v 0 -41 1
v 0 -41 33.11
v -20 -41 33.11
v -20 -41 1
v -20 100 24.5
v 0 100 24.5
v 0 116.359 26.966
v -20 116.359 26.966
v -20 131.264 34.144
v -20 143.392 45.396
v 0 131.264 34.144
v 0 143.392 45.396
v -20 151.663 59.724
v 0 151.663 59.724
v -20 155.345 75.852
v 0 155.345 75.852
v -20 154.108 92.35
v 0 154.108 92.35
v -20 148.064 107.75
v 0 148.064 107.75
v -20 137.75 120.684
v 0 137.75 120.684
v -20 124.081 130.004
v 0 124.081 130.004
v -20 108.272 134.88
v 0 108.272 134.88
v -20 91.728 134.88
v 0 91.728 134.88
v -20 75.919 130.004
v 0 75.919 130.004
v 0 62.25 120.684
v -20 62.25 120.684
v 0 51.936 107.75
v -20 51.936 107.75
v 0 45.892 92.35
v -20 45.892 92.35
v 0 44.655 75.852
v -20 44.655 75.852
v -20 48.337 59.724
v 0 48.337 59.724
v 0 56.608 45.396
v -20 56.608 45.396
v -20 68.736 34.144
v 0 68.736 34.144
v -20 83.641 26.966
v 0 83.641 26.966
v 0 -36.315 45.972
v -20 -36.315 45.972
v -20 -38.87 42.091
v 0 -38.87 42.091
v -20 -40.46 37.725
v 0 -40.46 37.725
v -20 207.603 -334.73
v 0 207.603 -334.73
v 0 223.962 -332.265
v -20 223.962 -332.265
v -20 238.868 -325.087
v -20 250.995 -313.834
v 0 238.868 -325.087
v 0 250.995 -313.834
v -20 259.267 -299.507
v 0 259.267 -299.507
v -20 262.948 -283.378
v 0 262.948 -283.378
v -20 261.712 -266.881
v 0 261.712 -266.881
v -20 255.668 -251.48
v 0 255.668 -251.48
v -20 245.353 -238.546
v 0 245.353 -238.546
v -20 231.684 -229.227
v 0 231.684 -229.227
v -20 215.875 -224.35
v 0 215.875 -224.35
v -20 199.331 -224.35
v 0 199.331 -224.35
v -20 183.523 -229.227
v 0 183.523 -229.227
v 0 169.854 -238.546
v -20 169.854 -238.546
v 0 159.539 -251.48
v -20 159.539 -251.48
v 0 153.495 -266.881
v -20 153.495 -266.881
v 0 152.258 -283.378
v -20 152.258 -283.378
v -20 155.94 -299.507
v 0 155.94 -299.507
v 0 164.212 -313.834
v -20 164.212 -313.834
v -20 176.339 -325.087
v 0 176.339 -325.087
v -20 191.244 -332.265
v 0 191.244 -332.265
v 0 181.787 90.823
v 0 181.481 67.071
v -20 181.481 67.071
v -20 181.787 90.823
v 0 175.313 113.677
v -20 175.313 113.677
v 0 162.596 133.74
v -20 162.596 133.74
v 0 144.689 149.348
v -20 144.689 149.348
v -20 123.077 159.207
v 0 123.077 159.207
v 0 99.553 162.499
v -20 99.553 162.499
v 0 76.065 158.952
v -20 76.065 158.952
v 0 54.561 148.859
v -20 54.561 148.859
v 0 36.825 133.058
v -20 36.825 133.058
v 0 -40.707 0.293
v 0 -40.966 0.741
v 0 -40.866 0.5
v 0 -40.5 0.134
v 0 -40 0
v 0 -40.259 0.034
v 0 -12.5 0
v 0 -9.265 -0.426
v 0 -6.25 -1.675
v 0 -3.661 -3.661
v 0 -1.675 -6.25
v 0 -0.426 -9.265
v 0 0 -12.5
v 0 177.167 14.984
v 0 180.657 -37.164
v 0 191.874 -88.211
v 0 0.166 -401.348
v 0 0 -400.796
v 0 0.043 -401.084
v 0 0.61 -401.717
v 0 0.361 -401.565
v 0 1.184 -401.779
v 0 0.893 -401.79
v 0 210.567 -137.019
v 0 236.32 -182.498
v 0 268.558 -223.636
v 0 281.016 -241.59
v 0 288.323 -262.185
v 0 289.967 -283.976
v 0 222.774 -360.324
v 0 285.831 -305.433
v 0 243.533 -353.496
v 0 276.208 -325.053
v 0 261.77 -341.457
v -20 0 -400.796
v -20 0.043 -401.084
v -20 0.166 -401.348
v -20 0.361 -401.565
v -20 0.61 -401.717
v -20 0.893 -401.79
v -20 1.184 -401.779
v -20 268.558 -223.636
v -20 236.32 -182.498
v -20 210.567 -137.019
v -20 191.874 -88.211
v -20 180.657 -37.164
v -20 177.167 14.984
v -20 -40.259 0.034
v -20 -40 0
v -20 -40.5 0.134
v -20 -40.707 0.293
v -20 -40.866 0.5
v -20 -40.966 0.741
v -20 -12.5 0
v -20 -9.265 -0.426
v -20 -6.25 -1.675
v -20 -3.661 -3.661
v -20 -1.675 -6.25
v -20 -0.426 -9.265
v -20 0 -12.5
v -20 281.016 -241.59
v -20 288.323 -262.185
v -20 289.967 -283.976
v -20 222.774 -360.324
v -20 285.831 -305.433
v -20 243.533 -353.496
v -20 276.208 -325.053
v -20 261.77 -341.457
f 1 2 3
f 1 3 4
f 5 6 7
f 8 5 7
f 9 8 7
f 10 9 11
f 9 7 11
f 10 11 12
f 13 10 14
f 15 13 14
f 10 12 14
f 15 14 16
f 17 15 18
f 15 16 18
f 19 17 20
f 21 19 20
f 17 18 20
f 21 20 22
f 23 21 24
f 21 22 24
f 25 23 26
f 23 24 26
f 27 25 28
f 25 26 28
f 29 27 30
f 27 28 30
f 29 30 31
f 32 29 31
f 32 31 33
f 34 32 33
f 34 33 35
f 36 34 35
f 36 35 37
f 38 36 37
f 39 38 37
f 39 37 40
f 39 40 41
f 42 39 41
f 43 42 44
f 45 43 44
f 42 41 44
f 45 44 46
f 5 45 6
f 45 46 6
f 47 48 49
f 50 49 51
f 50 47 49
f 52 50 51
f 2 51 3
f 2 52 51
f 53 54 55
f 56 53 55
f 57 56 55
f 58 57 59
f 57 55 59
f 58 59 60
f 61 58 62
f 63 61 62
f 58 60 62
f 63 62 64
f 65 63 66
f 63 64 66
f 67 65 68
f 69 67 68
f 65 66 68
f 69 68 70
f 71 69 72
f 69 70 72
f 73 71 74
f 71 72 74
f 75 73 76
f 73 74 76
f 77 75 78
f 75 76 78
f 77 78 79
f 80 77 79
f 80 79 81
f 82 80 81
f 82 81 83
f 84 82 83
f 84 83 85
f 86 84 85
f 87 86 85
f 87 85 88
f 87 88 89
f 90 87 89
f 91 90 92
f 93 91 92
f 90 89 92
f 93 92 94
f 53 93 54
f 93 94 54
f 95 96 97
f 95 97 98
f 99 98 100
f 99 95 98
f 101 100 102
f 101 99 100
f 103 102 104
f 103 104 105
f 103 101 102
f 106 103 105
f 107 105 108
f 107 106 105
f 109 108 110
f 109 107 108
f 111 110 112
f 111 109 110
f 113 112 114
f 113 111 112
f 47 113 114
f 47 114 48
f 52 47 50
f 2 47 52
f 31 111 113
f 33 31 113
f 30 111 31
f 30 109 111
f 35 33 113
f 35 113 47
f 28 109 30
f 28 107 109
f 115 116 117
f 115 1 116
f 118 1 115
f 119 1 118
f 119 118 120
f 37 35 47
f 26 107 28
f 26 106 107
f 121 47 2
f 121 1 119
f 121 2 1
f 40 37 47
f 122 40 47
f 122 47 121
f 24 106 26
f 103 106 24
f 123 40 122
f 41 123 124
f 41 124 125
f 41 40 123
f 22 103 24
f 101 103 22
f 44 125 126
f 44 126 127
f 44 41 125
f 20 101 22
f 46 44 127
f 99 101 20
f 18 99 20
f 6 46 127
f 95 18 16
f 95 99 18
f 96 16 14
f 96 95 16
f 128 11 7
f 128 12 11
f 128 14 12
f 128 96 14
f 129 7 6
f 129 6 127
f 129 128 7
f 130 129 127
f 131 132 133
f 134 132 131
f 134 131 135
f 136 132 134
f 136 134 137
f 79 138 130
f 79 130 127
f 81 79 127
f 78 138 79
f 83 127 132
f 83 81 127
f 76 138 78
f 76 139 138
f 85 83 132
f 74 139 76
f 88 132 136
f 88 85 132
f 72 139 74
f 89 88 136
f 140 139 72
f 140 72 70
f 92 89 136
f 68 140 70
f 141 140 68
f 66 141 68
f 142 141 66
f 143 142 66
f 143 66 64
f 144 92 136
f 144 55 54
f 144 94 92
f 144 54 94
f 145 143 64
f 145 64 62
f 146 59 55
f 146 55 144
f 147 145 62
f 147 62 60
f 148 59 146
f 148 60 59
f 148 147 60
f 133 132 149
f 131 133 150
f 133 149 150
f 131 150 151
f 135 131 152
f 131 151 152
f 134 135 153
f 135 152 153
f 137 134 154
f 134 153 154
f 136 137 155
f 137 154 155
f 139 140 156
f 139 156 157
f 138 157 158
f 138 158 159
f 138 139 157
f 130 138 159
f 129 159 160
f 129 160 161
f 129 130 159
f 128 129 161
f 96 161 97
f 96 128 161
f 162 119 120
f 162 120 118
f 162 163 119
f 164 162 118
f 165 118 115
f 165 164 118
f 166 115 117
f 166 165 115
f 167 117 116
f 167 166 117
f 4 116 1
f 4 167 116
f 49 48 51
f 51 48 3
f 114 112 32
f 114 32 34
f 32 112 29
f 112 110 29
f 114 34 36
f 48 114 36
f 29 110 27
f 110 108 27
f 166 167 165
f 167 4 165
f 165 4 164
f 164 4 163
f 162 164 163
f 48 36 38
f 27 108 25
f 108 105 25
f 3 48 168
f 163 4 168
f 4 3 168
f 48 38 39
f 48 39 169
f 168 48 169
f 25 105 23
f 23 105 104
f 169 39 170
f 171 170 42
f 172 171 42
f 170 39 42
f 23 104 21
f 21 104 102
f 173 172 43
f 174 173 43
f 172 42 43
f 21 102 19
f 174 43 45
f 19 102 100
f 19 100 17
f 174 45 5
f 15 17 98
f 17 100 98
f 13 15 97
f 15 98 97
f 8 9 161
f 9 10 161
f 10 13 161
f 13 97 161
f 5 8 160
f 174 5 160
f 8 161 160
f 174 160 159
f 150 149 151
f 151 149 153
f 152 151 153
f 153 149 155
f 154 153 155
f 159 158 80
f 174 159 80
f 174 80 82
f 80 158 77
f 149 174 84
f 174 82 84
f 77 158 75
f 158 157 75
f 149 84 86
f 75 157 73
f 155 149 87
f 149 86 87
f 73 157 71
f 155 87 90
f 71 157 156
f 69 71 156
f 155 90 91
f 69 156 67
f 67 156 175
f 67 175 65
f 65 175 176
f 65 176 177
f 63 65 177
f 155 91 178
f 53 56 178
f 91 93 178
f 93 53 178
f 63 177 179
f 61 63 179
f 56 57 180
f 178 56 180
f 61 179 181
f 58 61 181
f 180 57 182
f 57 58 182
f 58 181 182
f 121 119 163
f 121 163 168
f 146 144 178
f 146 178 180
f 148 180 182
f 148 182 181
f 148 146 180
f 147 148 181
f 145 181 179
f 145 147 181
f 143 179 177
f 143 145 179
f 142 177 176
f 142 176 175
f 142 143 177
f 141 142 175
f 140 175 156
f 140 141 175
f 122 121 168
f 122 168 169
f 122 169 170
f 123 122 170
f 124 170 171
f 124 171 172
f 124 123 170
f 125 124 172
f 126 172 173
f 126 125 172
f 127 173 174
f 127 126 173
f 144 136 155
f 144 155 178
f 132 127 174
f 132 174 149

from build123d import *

# Parameters (mm, degrees)
SKETCH1_R          = 55.5
BASE_FLANGE1_DEPTH = 20
FILLET_1_0_R       = 1


# Sheet-metal steps are written as plain solids
with BuildPart() as part:
    # Sketch1 → Base-Flange1 (new body)
    with BuildSketch(Plane(origin=(0, 0, 0), x_dir=(0, 0, -1), z_dir=(1, 0, 0))):
        with BuildLine():
            Line((0, -41), (0, -12.5))
            ThreePointArc((0, -12.5), (3.661165235, -3.661165235), (12.5, 0))
            Line((12.5, 0), (402, 0))
            Line((402, 0), (360.323614104, 222.774084629))
            ThreePointArc((360.323614104, 222.774084629), (305.433470455, 285.831465011), (223.63616123, 268.558327081))
            ThreePointArc((223.63616123, 268.558327081), (88.211160813, 191.873835227), (-67.07058856, 181.480551789))
            ThreePointArc((-67.07058856, 181.480551789), (-155.059207322, 134.23982179), (-133.058215758, 36.825038658))
            Line((-133.058215758, 36.825038658), (-45.972209781, -36.315142143))
            ThreePointArc((-45.972209781, -36.315142143), (-39.95421417, -39.792323471), (-33.109612021, -41))
            Line((-33.109612021, -41), (0, -41))
        make_face()
        with Locations((-80, 100)):
            Circle(SKETCH1_R, mode=Mode.SUBTRACT)
        with Locations((279.230483668, 207.603250897)):
            Circle(SKETCH1_R, mode=Mode.SUBTRACT)
    extrude(amount=-BASE_FLANGE1_DEPTH)

    # Fillet-1.0
    fillet_1_0_edges = [part.edges().sort_by_distance(p)[0] for p in [
        (-10, 0, -402),
        (-10, -41, 0),
    ]]
    fillet(fillet_1_0_edges, radius=FILLET_1_0_R)


solid = part.part
